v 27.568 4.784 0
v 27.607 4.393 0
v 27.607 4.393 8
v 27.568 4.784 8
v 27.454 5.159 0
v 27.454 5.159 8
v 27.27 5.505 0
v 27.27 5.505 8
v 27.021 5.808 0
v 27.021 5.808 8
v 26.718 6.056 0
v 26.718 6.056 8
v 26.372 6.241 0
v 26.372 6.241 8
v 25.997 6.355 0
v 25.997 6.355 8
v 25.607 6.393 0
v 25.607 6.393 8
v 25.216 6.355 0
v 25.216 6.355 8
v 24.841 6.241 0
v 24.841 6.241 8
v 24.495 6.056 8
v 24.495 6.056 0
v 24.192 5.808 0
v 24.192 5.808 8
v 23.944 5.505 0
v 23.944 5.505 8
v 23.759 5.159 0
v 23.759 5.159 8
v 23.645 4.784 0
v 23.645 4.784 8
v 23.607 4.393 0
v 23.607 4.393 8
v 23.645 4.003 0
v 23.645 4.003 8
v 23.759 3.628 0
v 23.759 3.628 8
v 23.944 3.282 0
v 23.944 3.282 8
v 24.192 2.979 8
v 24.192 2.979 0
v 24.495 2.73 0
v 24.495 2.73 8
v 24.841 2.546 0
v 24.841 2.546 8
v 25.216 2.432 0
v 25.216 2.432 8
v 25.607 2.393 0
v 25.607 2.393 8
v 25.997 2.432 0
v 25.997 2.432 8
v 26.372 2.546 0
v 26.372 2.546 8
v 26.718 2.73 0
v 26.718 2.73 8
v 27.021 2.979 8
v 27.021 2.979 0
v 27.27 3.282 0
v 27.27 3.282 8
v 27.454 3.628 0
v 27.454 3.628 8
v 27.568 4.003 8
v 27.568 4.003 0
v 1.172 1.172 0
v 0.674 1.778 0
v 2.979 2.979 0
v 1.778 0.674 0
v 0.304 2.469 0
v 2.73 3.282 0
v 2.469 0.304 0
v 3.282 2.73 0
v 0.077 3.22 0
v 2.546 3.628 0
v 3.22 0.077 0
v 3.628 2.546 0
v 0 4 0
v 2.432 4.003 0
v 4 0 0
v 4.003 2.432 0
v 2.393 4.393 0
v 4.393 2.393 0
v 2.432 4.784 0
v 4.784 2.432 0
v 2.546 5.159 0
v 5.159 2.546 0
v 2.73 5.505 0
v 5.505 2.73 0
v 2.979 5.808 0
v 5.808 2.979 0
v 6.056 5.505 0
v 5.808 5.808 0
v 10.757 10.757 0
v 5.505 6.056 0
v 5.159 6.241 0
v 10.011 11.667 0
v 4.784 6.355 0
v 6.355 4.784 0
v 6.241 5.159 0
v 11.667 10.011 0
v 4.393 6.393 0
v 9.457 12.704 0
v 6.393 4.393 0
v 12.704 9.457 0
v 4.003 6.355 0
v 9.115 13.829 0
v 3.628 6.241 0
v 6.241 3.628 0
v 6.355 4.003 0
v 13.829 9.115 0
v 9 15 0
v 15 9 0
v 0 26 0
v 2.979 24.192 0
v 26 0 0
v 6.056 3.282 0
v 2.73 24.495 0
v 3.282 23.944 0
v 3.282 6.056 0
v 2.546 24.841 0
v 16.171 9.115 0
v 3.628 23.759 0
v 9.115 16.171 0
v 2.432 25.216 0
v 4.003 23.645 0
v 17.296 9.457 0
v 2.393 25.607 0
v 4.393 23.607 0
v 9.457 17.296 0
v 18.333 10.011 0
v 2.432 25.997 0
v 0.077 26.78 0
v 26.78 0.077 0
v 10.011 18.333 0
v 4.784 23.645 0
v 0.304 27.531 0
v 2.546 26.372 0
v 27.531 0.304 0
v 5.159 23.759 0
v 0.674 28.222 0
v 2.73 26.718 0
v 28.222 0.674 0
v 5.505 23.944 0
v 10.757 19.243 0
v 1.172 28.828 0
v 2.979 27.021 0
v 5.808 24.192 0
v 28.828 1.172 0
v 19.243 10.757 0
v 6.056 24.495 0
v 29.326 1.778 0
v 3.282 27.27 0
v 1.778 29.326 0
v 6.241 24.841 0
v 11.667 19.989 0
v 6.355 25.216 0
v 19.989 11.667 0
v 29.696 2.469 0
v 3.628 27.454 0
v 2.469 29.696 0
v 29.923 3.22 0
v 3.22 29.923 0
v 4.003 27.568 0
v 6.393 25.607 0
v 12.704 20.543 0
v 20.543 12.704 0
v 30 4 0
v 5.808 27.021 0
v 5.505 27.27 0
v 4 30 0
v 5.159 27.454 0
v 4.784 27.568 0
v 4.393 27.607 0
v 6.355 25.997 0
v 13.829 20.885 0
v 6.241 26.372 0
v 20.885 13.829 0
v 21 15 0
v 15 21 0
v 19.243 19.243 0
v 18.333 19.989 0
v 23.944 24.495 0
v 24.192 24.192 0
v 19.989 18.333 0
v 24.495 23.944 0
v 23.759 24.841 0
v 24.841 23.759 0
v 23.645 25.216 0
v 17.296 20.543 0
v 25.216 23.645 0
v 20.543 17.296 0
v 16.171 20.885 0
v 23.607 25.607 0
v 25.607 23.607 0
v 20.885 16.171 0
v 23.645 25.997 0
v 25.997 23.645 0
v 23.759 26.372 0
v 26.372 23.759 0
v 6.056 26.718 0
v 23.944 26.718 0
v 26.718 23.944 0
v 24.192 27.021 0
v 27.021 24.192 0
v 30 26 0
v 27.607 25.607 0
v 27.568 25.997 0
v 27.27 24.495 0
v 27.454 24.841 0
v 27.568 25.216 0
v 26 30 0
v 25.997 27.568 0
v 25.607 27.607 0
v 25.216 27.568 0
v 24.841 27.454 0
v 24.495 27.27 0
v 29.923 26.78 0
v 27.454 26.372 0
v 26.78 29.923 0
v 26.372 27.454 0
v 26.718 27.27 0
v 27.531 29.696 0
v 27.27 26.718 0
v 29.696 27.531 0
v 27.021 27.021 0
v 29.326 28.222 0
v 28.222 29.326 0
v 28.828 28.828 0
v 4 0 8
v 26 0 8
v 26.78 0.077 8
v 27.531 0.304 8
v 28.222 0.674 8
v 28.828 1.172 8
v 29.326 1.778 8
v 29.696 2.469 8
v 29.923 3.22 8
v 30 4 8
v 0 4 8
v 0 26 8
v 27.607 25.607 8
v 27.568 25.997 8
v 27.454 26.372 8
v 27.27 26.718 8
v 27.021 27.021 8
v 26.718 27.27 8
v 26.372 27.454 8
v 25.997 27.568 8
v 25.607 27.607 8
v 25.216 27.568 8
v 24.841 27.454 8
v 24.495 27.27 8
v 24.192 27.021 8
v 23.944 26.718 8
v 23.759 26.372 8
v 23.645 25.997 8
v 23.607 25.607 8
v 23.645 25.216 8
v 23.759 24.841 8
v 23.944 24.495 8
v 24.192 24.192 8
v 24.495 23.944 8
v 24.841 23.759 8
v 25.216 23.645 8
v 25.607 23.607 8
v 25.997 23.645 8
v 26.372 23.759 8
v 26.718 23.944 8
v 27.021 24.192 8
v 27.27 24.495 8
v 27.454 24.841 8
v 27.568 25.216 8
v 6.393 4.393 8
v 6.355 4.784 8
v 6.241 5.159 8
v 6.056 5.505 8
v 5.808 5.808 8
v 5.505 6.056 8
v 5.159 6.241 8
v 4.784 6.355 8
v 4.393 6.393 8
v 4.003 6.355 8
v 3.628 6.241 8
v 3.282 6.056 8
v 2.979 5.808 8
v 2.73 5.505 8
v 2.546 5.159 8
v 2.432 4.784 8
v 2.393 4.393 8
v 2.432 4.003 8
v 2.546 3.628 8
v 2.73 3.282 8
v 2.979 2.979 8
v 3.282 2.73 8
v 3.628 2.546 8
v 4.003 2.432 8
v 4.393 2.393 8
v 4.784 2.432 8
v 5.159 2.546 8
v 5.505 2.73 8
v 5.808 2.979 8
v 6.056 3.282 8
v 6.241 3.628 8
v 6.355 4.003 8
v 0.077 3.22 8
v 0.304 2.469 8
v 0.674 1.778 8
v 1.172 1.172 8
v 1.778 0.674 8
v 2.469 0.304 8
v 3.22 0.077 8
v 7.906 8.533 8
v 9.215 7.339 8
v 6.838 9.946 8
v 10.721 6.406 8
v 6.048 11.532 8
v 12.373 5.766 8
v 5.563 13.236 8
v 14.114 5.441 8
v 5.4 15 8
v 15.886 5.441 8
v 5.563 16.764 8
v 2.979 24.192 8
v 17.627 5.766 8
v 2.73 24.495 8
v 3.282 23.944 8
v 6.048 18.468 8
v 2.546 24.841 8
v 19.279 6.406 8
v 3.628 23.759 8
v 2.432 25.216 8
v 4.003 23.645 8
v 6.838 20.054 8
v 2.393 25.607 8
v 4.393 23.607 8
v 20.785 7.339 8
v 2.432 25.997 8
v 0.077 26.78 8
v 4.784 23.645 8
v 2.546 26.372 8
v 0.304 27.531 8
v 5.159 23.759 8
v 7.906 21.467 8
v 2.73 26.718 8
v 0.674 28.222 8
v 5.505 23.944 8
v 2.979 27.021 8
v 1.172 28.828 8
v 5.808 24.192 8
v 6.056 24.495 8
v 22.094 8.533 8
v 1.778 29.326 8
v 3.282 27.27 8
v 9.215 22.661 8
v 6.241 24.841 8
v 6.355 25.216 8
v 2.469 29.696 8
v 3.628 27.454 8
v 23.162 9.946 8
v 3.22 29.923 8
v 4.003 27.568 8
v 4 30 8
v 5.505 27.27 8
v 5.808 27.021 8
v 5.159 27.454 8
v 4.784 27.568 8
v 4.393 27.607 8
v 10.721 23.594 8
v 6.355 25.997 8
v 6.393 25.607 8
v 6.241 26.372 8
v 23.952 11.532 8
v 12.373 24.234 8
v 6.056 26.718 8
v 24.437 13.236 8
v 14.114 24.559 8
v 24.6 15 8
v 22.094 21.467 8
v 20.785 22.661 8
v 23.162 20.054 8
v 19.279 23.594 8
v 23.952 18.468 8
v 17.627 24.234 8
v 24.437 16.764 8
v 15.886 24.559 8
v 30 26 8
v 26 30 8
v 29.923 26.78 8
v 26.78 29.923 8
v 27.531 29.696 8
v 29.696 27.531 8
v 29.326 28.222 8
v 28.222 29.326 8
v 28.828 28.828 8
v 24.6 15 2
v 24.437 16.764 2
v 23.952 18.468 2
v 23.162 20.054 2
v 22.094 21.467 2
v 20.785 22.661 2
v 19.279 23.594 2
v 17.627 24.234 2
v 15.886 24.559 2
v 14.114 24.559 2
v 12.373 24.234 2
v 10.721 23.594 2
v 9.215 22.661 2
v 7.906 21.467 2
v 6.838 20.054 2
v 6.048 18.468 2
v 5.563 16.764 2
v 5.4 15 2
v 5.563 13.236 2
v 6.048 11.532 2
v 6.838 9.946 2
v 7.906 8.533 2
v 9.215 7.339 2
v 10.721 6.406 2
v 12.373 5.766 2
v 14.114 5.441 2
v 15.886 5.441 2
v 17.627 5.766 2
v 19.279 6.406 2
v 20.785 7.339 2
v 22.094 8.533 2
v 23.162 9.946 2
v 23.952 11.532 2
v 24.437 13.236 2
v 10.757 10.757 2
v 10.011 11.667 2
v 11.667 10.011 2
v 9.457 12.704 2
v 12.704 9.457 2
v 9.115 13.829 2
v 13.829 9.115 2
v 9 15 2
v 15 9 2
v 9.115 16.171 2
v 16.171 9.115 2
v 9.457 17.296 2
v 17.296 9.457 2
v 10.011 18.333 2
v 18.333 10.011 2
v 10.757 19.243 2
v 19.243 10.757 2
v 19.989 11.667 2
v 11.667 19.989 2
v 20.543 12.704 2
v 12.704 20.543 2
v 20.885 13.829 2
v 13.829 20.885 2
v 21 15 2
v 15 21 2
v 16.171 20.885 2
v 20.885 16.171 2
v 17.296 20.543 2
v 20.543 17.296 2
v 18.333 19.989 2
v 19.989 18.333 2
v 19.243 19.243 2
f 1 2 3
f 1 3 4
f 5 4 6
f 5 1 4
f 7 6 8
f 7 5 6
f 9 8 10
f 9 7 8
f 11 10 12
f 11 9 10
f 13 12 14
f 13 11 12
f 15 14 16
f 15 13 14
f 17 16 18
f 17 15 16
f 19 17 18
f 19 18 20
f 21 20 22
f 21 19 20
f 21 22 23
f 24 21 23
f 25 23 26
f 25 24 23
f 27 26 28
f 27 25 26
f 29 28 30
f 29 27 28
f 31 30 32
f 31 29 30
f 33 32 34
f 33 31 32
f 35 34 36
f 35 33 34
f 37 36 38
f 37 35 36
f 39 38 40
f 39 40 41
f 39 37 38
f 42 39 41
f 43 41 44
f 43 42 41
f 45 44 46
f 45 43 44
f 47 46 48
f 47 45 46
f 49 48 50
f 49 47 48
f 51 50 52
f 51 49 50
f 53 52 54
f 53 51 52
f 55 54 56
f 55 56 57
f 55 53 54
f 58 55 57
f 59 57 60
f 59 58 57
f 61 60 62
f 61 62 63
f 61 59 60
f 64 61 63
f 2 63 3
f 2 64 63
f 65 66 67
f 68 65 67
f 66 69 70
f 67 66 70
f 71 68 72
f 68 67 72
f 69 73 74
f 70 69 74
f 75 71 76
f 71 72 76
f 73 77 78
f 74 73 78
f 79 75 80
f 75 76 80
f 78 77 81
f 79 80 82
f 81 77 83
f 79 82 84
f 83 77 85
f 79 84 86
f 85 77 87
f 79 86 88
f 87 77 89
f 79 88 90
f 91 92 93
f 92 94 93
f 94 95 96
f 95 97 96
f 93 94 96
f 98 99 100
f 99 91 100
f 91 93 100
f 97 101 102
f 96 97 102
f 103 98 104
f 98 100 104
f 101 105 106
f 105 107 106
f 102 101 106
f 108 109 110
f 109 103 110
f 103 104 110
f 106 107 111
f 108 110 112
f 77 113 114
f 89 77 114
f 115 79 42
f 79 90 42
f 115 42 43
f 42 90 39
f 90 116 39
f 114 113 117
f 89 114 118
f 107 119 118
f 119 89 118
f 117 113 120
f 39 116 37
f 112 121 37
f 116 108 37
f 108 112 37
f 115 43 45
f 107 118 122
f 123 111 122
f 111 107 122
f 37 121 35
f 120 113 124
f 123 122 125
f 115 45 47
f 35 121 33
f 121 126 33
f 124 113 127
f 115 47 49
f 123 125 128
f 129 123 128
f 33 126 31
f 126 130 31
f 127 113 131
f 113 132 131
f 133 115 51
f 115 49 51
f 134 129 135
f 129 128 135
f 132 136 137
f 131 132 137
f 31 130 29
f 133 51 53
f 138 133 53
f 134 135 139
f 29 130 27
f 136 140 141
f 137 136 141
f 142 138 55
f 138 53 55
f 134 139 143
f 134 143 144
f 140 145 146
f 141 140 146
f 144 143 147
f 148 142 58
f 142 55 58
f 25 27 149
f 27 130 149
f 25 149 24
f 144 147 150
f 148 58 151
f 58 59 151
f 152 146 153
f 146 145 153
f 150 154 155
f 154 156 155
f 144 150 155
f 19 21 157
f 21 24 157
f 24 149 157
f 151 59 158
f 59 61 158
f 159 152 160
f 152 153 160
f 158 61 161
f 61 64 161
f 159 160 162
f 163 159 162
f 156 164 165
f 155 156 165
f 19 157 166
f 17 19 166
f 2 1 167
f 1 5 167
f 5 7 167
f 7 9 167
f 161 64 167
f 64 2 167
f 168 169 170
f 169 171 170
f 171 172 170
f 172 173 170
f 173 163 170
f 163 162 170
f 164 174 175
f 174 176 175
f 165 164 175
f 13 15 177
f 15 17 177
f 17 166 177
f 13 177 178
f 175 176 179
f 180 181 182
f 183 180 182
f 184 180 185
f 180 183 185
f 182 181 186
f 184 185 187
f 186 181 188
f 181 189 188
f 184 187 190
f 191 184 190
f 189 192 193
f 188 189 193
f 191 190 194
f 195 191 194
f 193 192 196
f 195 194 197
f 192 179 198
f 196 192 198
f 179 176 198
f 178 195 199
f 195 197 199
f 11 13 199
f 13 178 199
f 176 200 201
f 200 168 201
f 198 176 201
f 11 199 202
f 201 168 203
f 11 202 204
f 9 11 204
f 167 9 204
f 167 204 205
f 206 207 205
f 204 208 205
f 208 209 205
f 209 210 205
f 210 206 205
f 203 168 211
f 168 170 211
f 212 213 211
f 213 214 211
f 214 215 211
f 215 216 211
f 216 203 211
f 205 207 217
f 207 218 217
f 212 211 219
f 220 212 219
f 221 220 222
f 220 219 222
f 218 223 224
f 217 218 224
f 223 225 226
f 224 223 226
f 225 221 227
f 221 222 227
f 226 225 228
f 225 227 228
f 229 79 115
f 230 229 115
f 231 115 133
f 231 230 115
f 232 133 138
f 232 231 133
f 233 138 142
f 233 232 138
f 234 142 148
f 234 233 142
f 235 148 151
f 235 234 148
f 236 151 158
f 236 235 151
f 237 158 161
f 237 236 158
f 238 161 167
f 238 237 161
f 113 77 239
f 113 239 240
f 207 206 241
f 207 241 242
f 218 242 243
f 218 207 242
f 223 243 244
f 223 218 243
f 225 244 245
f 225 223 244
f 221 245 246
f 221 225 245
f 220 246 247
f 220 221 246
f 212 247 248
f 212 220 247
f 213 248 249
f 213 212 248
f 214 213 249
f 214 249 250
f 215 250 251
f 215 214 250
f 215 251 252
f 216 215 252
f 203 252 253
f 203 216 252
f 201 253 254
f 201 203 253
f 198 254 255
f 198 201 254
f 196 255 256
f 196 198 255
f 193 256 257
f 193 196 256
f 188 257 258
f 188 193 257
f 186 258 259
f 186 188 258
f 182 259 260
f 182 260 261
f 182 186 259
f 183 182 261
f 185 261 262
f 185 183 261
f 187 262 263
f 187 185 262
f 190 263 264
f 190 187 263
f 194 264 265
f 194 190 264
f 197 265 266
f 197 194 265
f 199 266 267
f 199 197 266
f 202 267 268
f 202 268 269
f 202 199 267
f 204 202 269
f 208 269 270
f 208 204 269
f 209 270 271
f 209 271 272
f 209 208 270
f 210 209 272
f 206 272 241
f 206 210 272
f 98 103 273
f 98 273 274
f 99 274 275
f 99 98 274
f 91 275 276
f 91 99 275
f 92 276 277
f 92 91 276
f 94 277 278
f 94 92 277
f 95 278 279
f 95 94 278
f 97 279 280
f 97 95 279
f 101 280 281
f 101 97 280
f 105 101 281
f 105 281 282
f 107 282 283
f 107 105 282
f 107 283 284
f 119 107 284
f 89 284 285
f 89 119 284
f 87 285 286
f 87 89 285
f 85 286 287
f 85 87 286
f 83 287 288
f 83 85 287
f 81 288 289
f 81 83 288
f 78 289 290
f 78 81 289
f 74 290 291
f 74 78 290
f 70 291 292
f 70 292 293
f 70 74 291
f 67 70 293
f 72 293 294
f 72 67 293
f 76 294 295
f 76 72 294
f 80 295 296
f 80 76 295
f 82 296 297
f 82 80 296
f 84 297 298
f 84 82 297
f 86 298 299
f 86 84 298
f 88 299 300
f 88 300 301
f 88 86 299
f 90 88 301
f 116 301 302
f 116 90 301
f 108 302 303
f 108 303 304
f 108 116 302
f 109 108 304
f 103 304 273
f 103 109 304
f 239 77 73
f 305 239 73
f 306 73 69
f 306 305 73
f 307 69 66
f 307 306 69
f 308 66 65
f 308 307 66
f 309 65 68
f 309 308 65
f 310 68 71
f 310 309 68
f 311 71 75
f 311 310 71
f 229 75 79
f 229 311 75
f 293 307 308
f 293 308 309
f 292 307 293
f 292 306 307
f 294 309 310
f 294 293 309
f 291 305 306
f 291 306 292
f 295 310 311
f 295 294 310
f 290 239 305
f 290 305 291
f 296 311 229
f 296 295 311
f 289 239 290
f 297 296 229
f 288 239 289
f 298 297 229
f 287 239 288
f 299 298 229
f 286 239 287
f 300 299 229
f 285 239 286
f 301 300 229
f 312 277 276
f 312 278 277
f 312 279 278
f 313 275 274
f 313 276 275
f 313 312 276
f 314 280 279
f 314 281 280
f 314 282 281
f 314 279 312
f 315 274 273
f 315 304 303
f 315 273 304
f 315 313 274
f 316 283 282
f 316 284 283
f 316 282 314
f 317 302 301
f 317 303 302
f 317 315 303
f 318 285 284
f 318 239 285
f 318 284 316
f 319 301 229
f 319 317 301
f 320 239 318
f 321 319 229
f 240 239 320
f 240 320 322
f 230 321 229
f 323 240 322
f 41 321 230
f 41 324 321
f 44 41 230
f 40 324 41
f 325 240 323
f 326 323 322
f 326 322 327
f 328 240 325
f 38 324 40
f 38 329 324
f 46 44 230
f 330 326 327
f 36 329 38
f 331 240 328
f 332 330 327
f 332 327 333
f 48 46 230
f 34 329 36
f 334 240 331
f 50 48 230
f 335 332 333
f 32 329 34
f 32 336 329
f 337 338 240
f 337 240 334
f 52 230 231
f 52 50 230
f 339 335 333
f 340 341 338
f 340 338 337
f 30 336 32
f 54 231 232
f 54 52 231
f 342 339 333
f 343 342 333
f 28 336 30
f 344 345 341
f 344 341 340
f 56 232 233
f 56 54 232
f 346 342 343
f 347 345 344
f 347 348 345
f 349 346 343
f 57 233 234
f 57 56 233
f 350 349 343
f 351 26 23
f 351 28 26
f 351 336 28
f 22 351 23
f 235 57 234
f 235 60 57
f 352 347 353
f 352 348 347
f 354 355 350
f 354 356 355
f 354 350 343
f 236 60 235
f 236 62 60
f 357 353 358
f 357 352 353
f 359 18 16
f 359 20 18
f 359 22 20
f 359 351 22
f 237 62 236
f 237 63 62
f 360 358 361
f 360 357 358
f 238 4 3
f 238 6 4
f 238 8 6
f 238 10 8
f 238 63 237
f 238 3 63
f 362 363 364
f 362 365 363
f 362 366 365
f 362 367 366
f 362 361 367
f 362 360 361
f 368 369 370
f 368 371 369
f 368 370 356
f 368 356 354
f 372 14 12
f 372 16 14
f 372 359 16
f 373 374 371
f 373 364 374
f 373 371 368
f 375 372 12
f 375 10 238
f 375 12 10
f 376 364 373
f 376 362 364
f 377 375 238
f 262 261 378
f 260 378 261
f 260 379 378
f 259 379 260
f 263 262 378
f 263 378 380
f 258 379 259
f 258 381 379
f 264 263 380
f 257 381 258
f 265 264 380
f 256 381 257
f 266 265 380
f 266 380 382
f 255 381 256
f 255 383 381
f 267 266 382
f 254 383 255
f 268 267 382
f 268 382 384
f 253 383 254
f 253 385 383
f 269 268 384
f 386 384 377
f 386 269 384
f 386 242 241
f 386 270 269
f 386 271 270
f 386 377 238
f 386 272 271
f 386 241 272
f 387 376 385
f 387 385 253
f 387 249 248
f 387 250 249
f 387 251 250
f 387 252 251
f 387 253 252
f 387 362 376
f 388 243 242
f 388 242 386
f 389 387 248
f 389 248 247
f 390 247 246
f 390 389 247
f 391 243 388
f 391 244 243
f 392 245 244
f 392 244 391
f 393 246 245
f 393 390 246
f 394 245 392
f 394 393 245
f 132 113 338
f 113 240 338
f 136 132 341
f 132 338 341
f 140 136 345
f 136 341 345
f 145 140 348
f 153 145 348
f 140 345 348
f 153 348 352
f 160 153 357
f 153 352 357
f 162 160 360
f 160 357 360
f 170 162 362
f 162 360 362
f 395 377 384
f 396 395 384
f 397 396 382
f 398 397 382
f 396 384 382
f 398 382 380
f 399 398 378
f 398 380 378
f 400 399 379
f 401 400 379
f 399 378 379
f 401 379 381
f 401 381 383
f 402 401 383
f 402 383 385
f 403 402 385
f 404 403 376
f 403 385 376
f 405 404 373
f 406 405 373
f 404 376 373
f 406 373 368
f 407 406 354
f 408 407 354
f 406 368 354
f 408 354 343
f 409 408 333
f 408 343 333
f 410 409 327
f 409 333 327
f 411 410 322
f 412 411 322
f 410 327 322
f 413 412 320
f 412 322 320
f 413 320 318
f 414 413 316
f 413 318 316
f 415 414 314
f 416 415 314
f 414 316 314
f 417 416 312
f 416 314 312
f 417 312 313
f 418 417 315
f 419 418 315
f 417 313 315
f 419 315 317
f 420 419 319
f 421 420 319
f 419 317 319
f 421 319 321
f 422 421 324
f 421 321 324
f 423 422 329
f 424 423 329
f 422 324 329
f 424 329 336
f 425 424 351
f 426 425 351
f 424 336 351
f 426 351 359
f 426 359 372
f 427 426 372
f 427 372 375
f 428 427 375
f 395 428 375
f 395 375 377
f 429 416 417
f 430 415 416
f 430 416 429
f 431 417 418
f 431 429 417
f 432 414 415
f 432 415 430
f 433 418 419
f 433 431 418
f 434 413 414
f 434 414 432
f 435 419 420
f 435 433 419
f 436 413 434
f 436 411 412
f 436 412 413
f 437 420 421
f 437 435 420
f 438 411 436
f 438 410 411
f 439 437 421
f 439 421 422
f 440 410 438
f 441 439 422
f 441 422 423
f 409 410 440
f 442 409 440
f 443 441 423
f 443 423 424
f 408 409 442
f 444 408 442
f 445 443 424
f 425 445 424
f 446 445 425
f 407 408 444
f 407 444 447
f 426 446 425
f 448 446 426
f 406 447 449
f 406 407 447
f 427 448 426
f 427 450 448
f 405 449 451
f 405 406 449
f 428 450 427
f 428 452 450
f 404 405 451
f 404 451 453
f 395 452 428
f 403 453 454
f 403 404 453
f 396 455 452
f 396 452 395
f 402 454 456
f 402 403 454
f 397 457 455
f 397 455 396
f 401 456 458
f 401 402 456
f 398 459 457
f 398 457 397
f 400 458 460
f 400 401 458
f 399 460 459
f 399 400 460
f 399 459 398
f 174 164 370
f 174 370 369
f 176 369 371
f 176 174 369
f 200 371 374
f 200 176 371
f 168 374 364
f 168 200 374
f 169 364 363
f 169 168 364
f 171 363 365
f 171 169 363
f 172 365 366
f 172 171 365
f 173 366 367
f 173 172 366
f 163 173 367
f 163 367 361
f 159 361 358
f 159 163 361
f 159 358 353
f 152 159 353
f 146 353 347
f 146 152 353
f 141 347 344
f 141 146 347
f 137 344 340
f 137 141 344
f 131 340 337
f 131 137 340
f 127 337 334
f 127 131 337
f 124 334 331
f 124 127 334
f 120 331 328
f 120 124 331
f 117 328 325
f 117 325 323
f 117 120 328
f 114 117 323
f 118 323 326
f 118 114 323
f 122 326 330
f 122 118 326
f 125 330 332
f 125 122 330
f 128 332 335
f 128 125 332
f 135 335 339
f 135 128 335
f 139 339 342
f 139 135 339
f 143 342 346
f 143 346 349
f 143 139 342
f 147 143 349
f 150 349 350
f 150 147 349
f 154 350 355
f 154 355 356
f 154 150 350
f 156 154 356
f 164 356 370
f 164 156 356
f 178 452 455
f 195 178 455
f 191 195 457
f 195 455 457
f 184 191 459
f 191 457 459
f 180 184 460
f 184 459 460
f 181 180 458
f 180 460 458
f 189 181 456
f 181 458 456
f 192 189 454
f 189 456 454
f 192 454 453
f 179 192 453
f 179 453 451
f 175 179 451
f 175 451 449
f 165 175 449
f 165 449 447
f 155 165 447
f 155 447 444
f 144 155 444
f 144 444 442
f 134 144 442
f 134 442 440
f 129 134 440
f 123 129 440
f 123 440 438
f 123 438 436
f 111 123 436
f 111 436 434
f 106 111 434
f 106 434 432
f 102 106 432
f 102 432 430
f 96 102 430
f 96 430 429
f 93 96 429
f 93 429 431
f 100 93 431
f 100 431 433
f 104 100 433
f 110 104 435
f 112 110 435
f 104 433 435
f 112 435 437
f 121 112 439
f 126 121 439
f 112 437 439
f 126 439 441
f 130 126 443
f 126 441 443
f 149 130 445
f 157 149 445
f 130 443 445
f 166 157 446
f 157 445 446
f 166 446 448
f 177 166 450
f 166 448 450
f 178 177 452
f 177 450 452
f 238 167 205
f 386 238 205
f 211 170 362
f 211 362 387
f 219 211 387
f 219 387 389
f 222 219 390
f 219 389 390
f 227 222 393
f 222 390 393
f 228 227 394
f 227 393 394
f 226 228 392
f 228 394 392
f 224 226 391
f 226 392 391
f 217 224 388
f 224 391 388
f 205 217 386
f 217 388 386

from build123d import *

# Parameters (mm, degrees)
SKETCH1_W           = 30
SKETCH1_H           = 30
SKETCH1_R           = 2
BOSS_EXTRUDE1_DEPTH = 8
SKETCH2_R           = 9.6
CUT_EXTRUDE1_DEPTH  = 6
SKETCH3_R           = 6
CUT_EXTRUDE2_DEPTH  = 7
FILLET1_R           = 4


with BuildPart() as part:
    # Sketch1 → Boss-Extrude1 (new body)
    with BuildSketch(Plane.XY):
        with Locations((15, 15)):
            Rectangle(SKETCH1_W, SKETCH1_H)
        with Locations((25.606601718, 25.606601718)):
            Circle(SKETCH1_R, mode=Mode.SUBTRACT)
        with Locations((25.606601718, 4.393398282)):
            Circle(SKETCH1_R, mode=Mode.SUBTRACT)
        with Locations((4.393398282, 4.393398282)):
            Circle(SKETCH1_R, mode=Mode.SUBTRACT)
        with Locations((4.393398282, 25.606601718)):
            Circle(SKETCH1_R, mode=Mode.SUBTRACT)
    extrude(amount=BOSS_EXTRUDE1_DEPTH)

    # Sketch2 → Cut-Extrude1 (cut)
    with BuildSketch(Plane.XY.offset(8)):
        with Locations((15, 15)):
            Circle(SKETCH2_R)
    extrude(amount=-CUT_EXTRUDE1_DEPTH, mode=Mode.SUBTRACT)

    # Sketch3 → Cut-Extrude2 (cut)
    with BuildSketch(Plane.XY.offset(2)):
        with Locations((15, 15)):
            Circle(SKETCH3_R)
    extrude(amount=-CUT_EXTRUDE2_DEPTH, mode=Mode.SUBTRACT)

    # Fillet1
    fillet1_edges = [part.edges().sort_by_distance(p)[0] for p in [
        (0, 30, 4),
        (30, 30, 4),
        (30, 0, 4),
        (0, 0, 4),
    ]]
    fillet(fillet1_edges, radius=FILLET1_R)


solid = part.part
